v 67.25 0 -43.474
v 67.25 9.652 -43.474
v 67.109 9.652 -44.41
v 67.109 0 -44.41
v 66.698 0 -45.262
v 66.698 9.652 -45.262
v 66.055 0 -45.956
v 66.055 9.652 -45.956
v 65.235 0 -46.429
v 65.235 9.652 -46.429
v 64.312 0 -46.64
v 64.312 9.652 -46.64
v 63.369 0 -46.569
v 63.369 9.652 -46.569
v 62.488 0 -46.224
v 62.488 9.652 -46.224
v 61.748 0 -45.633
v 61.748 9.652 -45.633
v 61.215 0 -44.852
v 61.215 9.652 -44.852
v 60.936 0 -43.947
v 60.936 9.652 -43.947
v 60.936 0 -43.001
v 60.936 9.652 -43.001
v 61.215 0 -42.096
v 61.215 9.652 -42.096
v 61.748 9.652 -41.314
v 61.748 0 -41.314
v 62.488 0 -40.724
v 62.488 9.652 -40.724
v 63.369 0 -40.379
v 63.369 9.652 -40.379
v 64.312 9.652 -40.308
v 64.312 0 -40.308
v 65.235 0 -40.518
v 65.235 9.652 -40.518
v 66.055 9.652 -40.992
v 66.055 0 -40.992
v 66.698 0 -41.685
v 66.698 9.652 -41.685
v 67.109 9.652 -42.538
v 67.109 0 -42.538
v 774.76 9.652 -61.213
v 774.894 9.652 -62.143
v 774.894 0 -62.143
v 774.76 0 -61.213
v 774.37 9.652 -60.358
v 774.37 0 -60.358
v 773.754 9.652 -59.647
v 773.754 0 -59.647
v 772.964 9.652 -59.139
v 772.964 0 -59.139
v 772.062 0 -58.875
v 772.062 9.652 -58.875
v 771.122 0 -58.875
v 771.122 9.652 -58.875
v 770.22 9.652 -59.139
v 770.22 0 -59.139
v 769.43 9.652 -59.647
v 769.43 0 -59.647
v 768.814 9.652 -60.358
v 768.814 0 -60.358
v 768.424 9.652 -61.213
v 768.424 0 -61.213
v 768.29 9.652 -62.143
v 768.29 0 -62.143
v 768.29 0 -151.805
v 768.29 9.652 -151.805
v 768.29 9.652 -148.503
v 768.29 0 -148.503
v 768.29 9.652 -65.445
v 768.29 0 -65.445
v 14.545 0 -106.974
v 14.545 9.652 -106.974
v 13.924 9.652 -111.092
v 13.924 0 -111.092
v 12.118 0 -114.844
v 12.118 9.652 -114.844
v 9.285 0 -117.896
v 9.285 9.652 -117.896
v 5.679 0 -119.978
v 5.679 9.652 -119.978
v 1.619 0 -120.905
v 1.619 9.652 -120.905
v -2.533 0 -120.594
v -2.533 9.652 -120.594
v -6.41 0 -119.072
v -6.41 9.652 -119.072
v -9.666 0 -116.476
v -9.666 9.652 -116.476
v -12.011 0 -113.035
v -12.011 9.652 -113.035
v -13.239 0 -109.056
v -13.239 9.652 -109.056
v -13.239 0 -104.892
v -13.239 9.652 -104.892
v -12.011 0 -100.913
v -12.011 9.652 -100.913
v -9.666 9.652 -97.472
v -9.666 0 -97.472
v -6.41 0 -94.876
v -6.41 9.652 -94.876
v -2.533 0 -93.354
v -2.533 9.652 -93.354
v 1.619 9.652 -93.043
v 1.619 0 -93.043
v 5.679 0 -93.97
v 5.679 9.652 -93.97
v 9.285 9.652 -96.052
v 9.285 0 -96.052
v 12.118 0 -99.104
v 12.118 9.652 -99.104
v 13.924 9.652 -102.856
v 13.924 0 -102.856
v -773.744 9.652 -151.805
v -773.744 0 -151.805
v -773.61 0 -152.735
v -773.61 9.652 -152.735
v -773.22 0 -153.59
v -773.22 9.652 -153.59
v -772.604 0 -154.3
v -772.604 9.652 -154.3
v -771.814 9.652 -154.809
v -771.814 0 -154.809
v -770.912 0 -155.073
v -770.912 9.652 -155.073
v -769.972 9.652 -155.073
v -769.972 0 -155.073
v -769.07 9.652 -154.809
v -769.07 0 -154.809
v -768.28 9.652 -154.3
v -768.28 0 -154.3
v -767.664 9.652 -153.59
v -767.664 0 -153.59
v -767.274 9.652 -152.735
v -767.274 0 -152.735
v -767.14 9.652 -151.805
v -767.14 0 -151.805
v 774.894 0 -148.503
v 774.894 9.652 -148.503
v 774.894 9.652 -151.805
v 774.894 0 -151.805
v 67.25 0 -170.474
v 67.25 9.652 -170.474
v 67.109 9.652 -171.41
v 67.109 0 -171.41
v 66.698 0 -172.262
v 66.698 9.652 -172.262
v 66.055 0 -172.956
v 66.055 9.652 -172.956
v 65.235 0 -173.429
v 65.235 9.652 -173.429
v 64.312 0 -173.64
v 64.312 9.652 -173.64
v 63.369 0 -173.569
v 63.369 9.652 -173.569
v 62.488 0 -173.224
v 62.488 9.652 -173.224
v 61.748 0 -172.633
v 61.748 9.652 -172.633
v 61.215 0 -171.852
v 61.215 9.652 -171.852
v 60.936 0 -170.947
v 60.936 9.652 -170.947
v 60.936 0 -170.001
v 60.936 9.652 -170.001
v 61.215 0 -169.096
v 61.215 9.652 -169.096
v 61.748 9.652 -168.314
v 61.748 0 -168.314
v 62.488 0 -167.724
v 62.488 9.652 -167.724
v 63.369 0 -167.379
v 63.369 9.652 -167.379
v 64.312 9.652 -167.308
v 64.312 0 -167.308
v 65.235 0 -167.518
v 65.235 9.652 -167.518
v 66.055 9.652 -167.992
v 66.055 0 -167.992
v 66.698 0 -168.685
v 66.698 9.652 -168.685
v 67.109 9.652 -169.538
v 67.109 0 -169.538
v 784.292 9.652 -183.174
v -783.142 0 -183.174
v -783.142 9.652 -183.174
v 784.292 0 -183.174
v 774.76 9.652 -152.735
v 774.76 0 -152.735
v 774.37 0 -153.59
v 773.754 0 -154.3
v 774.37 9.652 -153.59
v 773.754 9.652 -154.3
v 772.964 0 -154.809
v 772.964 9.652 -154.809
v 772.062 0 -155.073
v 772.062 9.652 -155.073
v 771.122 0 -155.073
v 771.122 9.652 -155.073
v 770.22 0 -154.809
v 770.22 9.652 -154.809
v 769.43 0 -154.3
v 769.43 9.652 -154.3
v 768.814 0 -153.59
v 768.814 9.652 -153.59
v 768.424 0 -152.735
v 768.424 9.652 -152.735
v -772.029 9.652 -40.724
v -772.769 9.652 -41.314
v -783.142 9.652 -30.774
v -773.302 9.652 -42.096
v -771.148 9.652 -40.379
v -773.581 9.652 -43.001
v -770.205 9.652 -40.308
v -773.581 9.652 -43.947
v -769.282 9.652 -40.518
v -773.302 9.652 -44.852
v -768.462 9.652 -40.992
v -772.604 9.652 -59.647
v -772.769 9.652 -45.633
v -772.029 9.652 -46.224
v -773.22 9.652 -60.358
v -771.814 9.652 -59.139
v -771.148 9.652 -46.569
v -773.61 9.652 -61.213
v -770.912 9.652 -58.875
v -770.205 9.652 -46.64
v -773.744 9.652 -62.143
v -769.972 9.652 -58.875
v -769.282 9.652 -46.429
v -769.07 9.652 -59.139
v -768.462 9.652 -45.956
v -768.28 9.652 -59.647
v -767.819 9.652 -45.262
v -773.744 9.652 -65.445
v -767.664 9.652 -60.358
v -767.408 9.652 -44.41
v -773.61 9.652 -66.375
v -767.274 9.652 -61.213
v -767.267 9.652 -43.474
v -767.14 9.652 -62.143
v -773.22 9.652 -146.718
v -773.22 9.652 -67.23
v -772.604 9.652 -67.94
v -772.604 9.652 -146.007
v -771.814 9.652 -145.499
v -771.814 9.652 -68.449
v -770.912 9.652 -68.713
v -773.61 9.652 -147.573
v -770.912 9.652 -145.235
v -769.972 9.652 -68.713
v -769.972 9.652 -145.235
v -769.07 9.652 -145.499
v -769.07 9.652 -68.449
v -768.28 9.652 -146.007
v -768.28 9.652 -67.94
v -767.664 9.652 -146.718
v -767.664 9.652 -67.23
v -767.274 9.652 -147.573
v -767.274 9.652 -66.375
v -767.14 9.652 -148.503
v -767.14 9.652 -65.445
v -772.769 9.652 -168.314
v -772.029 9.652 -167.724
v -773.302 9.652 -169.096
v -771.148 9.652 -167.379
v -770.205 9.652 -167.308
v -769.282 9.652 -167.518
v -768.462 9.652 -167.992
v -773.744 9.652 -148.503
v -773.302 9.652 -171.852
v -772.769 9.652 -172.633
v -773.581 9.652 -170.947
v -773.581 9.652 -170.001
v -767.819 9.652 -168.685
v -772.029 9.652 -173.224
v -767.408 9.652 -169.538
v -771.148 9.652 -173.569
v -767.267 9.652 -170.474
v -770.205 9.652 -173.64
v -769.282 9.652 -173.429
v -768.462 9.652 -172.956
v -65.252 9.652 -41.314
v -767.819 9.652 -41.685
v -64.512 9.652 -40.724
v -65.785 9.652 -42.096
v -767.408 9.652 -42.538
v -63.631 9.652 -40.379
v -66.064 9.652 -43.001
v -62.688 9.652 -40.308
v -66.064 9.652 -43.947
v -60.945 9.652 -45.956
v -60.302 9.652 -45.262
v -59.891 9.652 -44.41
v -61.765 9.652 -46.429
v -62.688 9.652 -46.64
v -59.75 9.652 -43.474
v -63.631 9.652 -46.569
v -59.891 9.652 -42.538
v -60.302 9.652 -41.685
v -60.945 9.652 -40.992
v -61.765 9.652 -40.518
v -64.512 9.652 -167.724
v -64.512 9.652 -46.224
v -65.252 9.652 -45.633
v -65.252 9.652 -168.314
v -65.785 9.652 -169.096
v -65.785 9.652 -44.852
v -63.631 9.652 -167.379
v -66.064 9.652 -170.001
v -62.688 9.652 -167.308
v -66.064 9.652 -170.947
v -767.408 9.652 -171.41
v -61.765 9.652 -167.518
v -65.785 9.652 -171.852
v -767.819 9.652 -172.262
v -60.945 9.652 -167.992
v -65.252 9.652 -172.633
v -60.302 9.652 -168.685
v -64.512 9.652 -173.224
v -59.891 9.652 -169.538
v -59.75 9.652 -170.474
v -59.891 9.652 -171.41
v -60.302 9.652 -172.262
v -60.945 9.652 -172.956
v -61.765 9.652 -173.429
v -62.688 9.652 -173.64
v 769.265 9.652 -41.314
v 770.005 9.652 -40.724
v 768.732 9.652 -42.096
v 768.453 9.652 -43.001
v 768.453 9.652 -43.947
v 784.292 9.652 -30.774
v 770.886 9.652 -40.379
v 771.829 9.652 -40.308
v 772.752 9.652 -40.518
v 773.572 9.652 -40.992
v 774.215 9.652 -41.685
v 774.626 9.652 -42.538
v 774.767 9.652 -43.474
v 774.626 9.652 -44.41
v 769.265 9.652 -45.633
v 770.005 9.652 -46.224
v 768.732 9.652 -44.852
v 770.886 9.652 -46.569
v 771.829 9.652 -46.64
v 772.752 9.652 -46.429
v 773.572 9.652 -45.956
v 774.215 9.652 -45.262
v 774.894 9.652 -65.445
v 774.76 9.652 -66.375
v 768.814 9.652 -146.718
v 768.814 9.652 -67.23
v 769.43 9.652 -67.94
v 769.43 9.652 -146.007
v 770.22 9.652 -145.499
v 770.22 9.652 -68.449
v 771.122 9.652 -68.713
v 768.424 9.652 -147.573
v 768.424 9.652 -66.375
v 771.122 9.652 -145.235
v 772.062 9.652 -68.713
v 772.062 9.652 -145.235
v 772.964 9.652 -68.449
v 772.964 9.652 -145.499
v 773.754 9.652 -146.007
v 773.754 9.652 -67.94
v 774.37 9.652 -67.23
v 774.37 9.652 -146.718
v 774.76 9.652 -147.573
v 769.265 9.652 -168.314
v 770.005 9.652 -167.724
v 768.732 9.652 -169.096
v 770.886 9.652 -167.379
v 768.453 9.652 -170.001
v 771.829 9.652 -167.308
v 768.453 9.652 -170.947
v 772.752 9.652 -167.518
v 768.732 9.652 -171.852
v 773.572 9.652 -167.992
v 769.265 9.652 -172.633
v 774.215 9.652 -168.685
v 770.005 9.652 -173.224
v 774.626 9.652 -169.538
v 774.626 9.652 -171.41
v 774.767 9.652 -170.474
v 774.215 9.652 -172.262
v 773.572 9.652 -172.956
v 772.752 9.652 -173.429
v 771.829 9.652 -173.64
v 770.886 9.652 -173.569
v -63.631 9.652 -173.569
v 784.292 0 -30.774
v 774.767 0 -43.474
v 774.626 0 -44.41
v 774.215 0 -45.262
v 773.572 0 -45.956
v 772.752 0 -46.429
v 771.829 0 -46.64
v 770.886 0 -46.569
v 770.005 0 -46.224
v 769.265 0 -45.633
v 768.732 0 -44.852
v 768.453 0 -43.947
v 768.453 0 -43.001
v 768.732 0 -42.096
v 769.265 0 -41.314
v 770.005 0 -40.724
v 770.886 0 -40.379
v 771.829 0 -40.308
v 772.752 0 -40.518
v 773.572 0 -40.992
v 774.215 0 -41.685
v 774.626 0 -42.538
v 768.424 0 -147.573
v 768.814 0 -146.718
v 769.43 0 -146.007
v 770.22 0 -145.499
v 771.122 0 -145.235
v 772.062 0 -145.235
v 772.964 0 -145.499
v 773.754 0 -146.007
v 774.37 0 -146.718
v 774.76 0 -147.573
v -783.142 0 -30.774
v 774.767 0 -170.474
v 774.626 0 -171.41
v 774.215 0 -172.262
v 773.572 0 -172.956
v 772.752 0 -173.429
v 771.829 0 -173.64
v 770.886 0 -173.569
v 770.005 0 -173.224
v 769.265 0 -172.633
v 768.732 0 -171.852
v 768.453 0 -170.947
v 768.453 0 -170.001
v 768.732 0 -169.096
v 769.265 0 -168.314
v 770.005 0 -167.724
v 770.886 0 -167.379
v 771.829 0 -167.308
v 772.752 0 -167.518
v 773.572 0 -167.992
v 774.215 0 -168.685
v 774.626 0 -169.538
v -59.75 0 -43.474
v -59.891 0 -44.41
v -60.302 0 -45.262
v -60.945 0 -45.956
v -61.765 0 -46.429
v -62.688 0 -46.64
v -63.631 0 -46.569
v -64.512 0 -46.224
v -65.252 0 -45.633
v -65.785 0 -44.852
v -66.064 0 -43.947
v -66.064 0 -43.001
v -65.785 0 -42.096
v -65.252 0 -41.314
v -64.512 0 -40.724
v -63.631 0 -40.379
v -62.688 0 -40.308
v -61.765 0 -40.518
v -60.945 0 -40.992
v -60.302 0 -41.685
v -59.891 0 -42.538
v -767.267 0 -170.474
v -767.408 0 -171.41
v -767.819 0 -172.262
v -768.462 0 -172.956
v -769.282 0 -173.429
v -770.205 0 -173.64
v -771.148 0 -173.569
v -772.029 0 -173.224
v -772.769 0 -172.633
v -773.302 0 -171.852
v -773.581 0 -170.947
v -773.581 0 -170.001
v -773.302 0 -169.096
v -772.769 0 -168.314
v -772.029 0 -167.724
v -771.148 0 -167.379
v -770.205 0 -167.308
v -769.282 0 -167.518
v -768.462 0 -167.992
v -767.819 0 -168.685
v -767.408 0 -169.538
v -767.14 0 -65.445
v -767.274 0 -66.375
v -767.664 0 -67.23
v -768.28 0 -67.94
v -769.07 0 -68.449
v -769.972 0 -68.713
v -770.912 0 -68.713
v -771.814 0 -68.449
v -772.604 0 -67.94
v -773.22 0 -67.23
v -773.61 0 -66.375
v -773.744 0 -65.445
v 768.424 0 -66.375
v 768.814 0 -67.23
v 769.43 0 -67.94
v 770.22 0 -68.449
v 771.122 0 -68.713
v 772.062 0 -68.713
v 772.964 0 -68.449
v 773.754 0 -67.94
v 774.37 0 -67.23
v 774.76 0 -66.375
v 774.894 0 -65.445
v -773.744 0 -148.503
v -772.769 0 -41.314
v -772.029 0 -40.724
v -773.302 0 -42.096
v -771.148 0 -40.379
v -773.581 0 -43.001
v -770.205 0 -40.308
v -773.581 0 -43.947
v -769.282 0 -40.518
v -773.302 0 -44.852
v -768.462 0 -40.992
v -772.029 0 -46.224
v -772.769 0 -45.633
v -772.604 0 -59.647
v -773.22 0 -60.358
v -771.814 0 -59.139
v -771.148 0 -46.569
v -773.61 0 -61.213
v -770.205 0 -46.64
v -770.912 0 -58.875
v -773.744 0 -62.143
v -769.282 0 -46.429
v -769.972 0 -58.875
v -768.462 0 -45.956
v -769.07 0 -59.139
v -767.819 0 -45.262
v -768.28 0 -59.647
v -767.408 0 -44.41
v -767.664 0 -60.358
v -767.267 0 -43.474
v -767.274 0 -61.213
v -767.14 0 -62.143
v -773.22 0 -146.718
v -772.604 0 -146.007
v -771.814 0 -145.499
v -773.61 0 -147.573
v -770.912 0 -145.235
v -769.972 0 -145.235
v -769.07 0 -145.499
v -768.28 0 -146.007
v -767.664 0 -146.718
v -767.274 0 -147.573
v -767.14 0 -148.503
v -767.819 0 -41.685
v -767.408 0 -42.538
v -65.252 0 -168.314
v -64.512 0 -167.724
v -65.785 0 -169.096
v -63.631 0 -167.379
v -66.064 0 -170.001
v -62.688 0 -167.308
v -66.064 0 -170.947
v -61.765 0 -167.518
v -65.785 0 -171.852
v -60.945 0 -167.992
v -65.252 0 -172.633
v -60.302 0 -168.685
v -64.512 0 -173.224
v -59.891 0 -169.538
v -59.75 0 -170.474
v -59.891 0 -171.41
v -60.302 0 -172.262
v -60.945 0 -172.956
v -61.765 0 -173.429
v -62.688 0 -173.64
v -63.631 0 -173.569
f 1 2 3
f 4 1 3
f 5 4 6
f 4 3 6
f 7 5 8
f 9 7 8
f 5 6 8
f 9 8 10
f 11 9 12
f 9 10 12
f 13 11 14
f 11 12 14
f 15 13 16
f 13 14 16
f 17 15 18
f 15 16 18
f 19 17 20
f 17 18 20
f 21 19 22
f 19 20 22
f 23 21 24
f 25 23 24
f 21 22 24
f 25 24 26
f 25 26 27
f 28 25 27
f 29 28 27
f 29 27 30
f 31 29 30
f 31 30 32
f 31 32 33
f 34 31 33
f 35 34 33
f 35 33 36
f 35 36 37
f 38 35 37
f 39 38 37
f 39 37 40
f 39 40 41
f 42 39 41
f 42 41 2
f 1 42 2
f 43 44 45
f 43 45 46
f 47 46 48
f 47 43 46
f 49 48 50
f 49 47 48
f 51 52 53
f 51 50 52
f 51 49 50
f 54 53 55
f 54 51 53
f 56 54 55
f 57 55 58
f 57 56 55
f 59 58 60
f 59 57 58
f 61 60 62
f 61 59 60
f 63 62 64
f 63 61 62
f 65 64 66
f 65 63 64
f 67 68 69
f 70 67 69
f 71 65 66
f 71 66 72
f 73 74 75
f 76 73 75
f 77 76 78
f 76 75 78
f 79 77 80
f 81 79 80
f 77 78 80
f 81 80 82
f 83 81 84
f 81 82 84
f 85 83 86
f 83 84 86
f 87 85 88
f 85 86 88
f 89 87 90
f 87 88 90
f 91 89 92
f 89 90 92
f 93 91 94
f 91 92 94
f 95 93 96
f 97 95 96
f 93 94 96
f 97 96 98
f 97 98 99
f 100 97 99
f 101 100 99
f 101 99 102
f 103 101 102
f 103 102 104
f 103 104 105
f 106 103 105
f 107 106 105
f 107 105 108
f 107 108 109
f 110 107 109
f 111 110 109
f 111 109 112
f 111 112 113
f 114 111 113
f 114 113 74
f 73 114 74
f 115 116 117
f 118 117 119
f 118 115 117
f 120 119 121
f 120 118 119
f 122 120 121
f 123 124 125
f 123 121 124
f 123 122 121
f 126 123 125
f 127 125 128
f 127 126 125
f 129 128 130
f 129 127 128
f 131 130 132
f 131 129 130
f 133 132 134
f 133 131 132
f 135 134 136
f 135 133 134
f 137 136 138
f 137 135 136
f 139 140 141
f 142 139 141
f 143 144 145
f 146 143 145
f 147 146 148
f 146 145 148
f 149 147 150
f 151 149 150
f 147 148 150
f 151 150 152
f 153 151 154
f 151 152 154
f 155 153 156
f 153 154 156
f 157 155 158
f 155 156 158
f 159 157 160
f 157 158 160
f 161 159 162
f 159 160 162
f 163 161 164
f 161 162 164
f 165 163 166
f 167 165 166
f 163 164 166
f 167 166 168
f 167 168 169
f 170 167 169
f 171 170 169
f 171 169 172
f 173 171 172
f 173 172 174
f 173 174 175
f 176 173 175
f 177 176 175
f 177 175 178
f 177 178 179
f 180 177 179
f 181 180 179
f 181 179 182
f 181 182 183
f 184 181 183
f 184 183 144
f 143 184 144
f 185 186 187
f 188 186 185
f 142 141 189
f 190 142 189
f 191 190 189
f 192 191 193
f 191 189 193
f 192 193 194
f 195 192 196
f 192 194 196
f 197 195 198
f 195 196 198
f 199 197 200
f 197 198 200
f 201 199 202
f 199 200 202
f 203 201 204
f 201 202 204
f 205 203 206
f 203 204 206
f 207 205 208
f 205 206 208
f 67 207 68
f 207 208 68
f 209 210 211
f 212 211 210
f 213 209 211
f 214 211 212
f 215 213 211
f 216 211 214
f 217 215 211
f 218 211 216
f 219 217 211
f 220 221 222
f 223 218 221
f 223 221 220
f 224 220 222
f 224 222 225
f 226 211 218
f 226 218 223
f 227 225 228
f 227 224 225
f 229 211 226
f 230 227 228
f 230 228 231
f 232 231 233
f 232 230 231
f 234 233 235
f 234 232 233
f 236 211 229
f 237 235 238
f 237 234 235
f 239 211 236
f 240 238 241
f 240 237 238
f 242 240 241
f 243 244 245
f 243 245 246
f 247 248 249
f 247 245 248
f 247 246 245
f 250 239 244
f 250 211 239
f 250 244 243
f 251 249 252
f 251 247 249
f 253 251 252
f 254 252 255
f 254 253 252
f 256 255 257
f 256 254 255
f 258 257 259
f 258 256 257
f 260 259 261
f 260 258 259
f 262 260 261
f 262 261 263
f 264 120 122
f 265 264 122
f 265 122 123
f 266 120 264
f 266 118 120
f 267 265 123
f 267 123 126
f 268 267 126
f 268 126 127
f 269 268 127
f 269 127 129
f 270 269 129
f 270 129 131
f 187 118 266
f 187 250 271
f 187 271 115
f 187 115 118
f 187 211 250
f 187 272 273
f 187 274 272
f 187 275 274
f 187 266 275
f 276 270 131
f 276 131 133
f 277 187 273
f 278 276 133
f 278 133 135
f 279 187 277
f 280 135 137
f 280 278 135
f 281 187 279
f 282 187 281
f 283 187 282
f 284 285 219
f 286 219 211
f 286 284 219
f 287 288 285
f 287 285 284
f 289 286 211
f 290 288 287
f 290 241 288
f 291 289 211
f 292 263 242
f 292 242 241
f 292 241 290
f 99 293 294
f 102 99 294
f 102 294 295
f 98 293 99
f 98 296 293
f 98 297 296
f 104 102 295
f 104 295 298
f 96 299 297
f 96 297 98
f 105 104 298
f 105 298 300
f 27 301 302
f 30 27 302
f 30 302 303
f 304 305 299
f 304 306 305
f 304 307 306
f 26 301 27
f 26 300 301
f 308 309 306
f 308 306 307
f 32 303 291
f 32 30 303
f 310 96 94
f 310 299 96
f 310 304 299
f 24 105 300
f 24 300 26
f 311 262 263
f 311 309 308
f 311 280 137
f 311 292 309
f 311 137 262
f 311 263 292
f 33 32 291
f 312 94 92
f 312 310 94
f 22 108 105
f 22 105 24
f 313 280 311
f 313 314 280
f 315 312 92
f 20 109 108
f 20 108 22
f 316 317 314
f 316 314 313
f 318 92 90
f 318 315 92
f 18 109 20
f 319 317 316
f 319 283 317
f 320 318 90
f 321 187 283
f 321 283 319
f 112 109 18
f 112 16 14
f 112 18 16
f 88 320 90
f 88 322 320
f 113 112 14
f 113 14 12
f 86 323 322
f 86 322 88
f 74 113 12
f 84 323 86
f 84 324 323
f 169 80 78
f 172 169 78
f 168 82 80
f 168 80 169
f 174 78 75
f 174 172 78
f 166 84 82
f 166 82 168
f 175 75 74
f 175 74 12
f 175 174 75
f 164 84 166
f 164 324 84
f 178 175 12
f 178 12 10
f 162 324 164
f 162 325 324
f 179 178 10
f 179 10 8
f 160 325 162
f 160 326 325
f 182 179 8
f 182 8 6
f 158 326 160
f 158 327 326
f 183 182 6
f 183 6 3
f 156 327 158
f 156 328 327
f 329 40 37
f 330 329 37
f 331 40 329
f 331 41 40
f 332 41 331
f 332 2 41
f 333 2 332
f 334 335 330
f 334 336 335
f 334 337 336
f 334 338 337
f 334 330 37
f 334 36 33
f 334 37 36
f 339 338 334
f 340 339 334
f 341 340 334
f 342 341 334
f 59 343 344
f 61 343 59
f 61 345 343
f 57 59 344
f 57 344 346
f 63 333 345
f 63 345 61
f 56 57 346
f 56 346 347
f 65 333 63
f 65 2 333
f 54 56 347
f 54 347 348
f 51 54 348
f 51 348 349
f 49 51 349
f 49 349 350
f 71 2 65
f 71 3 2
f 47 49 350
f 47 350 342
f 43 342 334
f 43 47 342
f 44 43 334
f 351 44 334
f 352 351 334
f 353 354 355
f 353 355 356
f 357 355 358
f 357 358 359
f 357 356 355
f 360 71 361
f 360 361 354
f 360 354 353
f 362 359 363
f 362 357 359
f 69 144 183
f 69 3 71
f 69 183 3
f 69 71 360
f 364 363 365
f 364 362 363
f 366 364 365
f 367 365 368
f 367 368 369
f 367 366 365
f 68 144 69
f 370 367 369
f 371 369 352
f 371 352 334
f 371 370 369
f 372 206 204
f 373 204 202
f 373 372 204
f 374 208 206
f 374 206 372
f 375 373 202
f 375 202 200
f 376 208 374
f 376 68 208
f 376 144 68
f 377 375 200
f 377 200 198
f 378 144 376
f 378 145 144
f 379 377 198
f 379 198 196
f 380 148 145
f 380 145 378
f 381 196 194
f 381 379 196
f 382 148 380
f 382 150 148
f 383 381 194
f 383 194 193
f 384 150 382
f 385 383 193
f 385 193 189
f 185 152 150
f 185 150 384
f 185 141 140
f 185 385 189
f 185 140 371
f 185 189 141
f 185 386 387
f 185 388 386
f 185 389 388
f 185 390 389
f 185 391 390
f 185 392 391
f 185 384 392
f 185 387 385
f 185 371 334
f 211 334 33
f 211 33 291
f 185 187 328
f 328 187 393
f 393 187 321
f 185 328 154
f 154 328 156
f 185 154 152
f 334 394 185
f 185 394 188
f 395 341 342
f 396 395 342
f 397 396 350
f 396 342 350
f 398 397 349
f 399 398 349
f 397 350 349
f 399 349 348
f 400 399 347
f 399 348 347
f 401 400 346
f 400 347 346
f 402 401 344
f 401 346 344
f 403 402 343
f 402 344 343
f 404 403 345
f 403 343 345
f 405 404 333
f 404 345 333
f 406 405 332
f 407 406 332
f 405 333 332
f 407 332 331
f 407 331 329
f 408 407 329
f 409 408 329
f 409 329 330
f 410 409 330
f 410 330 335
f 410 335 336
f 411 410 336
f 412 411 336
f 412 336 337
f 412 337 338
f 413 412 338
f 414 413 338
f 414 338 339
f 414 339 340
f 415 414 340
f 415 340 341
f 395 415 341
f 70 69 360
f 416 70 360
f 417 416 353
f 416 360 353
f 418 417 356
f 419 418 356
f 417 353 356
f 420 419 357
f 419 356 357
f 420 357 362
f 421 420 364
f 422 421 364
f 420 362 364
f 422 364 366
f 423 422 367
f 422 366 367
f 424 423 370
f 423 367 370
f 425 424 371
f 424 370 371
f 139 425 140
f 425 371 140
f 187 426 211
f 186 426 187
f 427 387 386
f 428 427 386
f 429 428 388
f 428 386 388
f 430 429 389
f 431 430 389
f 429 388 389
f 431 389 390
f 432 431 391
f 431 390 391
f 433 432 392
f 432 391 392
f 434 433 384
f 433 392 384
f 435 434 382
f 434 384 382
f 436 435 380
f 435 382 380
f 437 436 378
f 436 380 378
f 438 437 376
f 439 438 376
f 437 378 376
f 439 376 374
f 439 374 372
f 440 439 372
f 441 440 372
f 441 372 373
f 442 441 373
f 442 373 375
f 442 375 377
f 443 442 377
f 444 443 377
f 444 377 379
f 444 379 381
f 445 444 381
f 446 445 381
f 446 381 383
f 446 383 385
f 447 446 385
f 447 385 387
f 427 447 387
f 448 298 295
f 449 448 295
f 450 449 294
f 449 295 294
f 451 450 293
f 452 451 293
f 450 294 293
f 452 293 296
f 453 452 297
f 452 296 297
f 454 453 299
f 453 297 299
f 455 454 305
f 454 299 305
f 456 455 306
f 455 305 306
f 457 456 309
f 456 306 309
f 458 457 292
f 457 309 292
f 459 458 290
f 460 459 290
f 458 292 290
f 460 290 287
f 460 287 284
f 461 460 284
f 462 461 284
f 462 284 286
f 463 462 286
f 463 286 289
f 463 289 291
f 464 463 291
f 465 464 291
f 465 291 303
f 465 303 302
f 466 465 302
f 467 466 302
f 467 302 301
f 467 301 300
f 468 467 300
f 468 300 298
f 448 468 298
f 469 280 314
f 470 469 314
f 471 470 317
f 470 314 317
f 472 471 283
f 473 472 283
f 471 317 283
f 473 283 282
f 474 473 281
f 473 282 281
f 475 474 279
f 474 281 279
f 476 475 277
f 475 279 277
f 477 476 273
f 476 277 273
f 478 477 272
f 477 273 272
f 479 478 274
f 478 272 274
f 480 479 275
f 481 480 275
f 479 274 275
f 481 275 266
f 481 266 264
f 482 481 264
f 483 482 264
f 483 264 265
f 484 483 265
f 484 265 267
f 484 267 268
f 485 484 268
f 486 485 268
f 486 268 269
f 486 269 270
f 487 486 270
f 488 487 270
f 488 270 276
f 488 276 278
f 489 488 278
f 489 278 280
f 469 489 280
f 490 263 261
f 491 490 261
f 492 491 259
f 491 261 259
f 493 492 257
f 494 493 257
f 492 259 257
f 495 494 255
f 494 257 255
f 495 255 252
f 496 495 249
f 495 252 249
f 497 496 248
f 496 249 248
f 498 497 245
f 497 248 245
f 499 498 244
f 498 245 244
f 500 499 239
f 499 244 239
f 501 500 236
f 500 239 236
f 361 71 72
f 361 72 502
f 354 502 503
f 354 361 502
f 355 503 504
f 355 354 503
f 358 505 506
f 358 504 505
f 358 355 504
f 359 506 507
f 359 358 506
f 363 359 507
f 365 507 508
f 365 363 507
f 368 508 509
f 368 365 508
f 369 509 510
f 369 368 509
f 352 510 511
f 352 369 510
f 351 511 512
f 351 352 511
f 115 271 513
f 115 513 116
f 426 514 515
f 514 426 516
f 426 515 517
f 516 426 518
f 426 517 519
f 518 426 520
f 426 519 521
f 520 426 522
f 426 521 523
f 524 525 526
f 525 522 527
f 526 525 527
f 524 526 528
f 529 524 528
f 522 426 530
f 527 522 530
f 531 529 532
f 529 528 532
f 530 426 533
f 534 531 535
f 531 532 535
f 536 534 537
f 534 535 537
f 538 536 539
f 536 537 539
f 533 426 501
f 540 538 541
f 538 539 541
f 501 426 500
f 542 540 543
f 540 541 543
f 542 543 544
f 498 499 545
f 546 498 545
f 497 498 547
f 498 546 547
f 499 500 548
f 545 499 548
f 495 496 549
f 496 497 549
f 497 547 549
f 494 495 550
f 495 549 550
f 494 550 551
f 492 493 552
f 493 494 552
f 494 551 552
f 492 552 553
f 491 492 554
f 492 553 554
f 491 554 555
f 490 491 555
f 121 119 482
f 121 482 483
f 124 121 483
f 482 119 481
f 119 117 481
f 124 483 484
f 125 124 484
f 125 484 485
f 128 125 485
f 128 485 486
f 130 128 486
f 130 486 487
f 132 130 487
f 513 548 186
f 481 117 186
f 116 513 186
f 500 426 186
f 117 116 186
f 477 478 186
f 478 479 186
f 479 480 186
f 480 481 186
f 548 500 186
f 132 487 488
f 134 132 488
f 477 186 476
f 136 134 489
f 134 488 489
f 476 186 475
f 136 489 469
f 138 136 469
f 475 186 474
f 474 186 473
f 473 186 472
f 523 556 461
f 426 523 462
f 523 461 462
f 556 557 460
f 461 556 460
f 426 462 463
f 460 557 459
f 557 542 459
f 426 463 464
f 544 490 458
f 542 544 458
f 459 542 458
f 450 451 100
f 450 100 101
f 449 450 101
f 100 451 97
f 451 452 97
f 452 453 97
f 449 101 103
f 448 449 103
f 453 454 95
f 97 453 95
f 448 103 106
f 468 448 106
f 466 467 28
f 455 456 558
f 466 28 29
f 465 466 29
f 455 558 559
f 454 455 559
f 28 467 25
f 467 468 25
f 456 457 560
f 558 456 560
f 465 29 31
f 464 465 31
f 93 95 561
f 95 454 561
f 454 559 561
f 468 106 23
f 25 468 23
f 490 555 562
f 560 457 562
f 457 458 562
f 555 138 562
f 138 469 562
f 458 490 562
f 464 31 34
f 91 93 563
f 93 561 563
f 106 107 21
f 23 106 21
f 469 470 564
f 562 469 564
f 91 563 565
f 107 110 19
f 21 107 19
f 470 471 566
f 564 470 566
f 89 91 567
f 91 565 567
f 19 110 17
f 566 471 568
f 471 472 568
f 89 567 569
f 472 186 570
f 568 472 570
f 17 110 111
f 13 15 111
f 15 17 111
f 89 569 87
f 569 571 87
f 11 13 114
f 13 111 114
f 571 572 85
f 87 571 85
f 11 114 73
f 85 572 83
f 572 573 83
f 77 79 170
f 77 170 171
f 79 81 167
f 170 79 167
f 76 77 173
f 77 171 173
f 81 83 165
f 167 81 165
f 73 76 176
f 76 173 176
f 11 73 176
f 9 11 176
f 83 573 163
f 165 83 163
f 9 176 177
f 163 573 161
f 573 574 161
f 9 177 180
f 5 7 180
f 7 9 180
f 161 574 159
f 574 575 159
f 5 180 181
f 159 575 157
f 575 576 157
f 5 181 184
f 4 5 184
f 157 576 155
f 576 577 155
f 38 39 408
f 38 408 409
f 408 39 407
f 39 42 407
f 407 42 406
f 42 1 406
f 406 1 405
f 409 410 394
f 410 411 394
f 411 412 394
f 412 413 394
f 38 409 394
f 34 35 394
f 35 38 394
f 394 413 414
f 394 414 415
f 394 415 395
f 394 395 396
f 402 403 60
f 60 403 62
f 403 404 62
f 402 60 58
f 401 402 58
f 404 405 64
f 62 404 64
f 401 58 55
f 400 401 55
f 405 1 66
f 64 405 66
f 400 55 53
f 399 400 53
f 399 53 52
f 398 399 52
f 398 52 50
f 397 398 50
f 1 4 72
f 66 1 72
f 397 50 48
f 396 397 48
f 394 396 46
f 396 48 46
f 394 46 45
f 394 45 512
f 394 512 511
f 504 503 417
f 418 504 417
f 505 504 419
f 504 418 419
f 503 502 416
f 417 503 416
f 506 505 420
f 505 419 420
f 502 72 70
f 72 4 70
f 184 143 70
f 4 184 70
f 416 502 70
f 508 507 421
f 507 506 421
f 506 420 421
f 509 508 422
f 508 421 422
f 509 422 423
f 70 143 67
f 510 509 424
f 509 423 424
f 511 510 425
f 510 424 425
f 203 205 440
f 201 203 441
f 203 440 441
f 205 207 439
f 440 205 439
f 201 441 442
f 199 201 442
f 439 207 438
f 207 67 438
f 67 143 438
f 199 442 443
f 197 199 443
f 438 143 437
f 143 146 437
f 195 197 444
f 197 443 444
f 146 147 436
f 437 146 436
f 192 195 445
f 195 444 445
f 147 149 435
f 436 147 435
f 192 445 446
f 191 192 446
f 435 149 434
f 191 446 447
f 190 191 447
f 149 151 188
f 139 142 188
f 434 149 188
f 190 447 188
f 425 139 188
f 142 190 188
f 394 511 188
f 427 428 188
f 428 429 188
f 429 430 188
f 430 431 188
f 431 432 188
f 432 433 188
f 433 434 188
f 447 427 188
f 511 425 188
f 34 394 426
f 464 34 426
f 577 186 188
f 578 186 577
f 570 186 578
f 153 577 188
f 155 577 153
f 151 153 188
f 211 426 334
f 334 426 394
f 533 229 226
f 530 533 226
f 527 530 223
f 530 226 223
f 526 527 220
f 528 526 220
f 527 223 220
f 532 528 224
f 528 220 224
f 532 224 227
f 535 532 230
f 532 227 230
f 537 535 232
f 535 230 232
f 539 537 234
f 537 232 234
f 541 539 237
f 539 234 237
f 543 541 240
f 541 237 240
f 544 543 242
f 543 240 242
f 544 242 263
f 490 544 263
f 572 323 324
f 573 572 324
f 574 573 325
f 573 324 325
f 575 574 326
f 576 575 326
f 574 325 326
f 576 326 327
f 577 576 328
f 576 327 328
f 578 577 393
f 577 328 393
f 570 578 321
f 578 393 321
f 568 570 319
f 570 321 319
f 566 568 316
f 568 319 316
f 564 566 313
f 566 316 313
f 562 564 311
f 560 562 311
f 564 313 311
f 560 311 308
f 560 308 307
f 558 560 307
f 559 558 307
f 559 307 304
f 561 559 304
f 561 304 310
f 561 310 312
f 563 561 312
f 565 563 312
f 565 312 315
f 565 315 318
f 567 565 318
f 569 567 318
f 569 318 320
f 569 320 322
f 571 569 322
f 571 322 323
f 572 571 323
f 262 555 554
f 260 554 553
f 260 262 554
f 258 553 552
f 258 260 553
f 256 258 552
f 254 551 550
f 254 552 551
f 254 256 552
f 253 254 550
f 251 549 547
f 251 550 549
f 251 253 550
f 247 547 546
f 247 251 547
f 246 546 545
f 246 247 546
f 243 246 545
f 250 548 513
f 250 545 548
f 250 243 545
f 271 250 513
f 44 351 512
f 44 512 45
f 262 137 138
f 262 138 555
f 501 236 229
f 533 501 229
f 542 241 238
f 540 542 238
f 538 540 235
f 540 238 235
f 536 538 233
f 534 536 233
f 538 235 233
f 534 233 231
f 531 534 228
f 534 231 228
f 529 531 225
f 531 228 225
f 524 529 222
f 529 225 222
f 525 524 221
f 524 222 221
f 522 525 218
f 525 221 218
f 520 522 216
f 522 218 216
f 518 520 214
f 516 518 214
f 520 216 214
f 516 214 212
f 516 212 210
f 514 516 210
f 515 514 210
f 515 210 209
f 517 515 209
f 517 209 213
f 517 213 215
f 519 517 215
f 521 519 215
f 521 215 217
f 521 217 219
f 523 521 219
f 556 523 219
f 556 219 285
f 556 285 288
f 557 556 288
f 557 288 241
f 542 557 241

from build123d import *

# Parameters (mm, degrees)
SKETCH1_W           = 1567.434
SKETCH1_H           = 152.4
BOSS_EXTRUDE1_DEPTH = 9.652
SKETCH2_R           = 3.175
SKETCH2_R_2         = 13.97
CUT_EXTRUDE2_DEPTH  = 10.652


with BuildPart() as part:
    # Sketch1 → Boss-Extrude1 (new body)
    with BuildSketch(Plane(origin=(0, 0, 0), x_dir=(1, 0, 0), z_dir=(0, 1, 0))):
        with Locations((0.575131409, 106.973938621)):
            Rectangle(SKETCH1_W, SKETCH1_H)
    extrude(amount=BOSS_EXTRUDE1_DEPTH)

    # Sketch2 → Cut-Extrude2 (cut, through all)
    with BuildSketch(Plane(origin=(0, 9.652, 0), x_dir=(1, 0, 0), z_dir=(0, 1, 0))):
        with Locations((-770.441868591, 170.473938621)):
            Circle(SKETCH2_R)
        with Locations((-770.441868591, 43.473938621)):
            Circle(SKETCH2_R)
        with Locations((771.592131409, 43.473938621)):
            Circle(SKETCH2_R)
        with Locations((771.592131409, 170.473938621)):
            Circle(SKETCH2_R)
        with Locations((0.575131409, 106.973938621)):
            Circle(SKETCH2_R_2)
        with Locations((-62.924868591, 170.473938621)):
            Circle(SKETCH2_R)
        with Locations((-62.924868591, 43.473938621)):
            Circle(SKETCH2_R)
        with Locations((64.075131409, 43.473938621)):
            Circle(SKETCH2_R)
        with Locations((64.075131409, 170.473938621)):
            Circle(SKETCH2_R)
        with BuildLine():
            Line((-773.743868591, 148.502938621), (-773.743868591, 151.804938621))
            ThreePointArc((-773.743868591, 151.804938621), (-770.441868591, 155.106938621), (-767.139868591, 151.804938621))
            Line((-767.139868591, 151.804938621), (-767.139868591, 148.502938621))
            ThreePointArc((-767.139868591, 148.502938621), (-770.441868591, 145.200938621), (-773.743868591, 148.502938621))
        make_face()
        with BuildLine():
            Line((-773.743868591, 65.444938621), (-773.743868591, 62.142938621))
            ThreePointArc((-773.743868591, 62.142938621), (-770.441868591, 58.840938621), (-767.139868591, 62.142938621))
            Line((-767.139868591, 62.142938621), (-767.139868591, 65.444938621))
            ThreePointArc((-767.139868591, 65.444938621), (-770.441868591, 68.746938621), (-773.743868591, 65.444938621))
        make_face()
        with BuildLine():
            Line((774.894131409, 65.444938621), (774.894131409, 62.142938621))
            ThreePointArc((774.894131409, 62.142938621), (771.592131409, 58.840938621), (768.290131409, 62.142938621))
            Line((768.290131409, 62.142938621), (768.290131409, 65.444938621))
            ThreePointArc((768.290131409, 65.444938621), (771.592131409, 68.746938621), (774.894131409, 65.444938621))
        make_face()
        with BuildLine():
            Line((774.894131409, 148.502938621), (774.894131409, 151.804938621))
            ThreePointArc((774.894131409, 151.804938621), (771.592131409, 155.106938621), (768.290131409, 151.804938621))
            Line((768.290131409, 151.804938621), (768.290131409, 148.502938621))
            ThreePointArc((768.290131409, 148.502938621), (771.592131409, 145.200938621), (774.894131409, 148.502938621))
        make_face()
    extrude(amount=-CUT_EXTRUDE2_DEPTH, mode=Mode.SUBTRACT)


solid = part.part
